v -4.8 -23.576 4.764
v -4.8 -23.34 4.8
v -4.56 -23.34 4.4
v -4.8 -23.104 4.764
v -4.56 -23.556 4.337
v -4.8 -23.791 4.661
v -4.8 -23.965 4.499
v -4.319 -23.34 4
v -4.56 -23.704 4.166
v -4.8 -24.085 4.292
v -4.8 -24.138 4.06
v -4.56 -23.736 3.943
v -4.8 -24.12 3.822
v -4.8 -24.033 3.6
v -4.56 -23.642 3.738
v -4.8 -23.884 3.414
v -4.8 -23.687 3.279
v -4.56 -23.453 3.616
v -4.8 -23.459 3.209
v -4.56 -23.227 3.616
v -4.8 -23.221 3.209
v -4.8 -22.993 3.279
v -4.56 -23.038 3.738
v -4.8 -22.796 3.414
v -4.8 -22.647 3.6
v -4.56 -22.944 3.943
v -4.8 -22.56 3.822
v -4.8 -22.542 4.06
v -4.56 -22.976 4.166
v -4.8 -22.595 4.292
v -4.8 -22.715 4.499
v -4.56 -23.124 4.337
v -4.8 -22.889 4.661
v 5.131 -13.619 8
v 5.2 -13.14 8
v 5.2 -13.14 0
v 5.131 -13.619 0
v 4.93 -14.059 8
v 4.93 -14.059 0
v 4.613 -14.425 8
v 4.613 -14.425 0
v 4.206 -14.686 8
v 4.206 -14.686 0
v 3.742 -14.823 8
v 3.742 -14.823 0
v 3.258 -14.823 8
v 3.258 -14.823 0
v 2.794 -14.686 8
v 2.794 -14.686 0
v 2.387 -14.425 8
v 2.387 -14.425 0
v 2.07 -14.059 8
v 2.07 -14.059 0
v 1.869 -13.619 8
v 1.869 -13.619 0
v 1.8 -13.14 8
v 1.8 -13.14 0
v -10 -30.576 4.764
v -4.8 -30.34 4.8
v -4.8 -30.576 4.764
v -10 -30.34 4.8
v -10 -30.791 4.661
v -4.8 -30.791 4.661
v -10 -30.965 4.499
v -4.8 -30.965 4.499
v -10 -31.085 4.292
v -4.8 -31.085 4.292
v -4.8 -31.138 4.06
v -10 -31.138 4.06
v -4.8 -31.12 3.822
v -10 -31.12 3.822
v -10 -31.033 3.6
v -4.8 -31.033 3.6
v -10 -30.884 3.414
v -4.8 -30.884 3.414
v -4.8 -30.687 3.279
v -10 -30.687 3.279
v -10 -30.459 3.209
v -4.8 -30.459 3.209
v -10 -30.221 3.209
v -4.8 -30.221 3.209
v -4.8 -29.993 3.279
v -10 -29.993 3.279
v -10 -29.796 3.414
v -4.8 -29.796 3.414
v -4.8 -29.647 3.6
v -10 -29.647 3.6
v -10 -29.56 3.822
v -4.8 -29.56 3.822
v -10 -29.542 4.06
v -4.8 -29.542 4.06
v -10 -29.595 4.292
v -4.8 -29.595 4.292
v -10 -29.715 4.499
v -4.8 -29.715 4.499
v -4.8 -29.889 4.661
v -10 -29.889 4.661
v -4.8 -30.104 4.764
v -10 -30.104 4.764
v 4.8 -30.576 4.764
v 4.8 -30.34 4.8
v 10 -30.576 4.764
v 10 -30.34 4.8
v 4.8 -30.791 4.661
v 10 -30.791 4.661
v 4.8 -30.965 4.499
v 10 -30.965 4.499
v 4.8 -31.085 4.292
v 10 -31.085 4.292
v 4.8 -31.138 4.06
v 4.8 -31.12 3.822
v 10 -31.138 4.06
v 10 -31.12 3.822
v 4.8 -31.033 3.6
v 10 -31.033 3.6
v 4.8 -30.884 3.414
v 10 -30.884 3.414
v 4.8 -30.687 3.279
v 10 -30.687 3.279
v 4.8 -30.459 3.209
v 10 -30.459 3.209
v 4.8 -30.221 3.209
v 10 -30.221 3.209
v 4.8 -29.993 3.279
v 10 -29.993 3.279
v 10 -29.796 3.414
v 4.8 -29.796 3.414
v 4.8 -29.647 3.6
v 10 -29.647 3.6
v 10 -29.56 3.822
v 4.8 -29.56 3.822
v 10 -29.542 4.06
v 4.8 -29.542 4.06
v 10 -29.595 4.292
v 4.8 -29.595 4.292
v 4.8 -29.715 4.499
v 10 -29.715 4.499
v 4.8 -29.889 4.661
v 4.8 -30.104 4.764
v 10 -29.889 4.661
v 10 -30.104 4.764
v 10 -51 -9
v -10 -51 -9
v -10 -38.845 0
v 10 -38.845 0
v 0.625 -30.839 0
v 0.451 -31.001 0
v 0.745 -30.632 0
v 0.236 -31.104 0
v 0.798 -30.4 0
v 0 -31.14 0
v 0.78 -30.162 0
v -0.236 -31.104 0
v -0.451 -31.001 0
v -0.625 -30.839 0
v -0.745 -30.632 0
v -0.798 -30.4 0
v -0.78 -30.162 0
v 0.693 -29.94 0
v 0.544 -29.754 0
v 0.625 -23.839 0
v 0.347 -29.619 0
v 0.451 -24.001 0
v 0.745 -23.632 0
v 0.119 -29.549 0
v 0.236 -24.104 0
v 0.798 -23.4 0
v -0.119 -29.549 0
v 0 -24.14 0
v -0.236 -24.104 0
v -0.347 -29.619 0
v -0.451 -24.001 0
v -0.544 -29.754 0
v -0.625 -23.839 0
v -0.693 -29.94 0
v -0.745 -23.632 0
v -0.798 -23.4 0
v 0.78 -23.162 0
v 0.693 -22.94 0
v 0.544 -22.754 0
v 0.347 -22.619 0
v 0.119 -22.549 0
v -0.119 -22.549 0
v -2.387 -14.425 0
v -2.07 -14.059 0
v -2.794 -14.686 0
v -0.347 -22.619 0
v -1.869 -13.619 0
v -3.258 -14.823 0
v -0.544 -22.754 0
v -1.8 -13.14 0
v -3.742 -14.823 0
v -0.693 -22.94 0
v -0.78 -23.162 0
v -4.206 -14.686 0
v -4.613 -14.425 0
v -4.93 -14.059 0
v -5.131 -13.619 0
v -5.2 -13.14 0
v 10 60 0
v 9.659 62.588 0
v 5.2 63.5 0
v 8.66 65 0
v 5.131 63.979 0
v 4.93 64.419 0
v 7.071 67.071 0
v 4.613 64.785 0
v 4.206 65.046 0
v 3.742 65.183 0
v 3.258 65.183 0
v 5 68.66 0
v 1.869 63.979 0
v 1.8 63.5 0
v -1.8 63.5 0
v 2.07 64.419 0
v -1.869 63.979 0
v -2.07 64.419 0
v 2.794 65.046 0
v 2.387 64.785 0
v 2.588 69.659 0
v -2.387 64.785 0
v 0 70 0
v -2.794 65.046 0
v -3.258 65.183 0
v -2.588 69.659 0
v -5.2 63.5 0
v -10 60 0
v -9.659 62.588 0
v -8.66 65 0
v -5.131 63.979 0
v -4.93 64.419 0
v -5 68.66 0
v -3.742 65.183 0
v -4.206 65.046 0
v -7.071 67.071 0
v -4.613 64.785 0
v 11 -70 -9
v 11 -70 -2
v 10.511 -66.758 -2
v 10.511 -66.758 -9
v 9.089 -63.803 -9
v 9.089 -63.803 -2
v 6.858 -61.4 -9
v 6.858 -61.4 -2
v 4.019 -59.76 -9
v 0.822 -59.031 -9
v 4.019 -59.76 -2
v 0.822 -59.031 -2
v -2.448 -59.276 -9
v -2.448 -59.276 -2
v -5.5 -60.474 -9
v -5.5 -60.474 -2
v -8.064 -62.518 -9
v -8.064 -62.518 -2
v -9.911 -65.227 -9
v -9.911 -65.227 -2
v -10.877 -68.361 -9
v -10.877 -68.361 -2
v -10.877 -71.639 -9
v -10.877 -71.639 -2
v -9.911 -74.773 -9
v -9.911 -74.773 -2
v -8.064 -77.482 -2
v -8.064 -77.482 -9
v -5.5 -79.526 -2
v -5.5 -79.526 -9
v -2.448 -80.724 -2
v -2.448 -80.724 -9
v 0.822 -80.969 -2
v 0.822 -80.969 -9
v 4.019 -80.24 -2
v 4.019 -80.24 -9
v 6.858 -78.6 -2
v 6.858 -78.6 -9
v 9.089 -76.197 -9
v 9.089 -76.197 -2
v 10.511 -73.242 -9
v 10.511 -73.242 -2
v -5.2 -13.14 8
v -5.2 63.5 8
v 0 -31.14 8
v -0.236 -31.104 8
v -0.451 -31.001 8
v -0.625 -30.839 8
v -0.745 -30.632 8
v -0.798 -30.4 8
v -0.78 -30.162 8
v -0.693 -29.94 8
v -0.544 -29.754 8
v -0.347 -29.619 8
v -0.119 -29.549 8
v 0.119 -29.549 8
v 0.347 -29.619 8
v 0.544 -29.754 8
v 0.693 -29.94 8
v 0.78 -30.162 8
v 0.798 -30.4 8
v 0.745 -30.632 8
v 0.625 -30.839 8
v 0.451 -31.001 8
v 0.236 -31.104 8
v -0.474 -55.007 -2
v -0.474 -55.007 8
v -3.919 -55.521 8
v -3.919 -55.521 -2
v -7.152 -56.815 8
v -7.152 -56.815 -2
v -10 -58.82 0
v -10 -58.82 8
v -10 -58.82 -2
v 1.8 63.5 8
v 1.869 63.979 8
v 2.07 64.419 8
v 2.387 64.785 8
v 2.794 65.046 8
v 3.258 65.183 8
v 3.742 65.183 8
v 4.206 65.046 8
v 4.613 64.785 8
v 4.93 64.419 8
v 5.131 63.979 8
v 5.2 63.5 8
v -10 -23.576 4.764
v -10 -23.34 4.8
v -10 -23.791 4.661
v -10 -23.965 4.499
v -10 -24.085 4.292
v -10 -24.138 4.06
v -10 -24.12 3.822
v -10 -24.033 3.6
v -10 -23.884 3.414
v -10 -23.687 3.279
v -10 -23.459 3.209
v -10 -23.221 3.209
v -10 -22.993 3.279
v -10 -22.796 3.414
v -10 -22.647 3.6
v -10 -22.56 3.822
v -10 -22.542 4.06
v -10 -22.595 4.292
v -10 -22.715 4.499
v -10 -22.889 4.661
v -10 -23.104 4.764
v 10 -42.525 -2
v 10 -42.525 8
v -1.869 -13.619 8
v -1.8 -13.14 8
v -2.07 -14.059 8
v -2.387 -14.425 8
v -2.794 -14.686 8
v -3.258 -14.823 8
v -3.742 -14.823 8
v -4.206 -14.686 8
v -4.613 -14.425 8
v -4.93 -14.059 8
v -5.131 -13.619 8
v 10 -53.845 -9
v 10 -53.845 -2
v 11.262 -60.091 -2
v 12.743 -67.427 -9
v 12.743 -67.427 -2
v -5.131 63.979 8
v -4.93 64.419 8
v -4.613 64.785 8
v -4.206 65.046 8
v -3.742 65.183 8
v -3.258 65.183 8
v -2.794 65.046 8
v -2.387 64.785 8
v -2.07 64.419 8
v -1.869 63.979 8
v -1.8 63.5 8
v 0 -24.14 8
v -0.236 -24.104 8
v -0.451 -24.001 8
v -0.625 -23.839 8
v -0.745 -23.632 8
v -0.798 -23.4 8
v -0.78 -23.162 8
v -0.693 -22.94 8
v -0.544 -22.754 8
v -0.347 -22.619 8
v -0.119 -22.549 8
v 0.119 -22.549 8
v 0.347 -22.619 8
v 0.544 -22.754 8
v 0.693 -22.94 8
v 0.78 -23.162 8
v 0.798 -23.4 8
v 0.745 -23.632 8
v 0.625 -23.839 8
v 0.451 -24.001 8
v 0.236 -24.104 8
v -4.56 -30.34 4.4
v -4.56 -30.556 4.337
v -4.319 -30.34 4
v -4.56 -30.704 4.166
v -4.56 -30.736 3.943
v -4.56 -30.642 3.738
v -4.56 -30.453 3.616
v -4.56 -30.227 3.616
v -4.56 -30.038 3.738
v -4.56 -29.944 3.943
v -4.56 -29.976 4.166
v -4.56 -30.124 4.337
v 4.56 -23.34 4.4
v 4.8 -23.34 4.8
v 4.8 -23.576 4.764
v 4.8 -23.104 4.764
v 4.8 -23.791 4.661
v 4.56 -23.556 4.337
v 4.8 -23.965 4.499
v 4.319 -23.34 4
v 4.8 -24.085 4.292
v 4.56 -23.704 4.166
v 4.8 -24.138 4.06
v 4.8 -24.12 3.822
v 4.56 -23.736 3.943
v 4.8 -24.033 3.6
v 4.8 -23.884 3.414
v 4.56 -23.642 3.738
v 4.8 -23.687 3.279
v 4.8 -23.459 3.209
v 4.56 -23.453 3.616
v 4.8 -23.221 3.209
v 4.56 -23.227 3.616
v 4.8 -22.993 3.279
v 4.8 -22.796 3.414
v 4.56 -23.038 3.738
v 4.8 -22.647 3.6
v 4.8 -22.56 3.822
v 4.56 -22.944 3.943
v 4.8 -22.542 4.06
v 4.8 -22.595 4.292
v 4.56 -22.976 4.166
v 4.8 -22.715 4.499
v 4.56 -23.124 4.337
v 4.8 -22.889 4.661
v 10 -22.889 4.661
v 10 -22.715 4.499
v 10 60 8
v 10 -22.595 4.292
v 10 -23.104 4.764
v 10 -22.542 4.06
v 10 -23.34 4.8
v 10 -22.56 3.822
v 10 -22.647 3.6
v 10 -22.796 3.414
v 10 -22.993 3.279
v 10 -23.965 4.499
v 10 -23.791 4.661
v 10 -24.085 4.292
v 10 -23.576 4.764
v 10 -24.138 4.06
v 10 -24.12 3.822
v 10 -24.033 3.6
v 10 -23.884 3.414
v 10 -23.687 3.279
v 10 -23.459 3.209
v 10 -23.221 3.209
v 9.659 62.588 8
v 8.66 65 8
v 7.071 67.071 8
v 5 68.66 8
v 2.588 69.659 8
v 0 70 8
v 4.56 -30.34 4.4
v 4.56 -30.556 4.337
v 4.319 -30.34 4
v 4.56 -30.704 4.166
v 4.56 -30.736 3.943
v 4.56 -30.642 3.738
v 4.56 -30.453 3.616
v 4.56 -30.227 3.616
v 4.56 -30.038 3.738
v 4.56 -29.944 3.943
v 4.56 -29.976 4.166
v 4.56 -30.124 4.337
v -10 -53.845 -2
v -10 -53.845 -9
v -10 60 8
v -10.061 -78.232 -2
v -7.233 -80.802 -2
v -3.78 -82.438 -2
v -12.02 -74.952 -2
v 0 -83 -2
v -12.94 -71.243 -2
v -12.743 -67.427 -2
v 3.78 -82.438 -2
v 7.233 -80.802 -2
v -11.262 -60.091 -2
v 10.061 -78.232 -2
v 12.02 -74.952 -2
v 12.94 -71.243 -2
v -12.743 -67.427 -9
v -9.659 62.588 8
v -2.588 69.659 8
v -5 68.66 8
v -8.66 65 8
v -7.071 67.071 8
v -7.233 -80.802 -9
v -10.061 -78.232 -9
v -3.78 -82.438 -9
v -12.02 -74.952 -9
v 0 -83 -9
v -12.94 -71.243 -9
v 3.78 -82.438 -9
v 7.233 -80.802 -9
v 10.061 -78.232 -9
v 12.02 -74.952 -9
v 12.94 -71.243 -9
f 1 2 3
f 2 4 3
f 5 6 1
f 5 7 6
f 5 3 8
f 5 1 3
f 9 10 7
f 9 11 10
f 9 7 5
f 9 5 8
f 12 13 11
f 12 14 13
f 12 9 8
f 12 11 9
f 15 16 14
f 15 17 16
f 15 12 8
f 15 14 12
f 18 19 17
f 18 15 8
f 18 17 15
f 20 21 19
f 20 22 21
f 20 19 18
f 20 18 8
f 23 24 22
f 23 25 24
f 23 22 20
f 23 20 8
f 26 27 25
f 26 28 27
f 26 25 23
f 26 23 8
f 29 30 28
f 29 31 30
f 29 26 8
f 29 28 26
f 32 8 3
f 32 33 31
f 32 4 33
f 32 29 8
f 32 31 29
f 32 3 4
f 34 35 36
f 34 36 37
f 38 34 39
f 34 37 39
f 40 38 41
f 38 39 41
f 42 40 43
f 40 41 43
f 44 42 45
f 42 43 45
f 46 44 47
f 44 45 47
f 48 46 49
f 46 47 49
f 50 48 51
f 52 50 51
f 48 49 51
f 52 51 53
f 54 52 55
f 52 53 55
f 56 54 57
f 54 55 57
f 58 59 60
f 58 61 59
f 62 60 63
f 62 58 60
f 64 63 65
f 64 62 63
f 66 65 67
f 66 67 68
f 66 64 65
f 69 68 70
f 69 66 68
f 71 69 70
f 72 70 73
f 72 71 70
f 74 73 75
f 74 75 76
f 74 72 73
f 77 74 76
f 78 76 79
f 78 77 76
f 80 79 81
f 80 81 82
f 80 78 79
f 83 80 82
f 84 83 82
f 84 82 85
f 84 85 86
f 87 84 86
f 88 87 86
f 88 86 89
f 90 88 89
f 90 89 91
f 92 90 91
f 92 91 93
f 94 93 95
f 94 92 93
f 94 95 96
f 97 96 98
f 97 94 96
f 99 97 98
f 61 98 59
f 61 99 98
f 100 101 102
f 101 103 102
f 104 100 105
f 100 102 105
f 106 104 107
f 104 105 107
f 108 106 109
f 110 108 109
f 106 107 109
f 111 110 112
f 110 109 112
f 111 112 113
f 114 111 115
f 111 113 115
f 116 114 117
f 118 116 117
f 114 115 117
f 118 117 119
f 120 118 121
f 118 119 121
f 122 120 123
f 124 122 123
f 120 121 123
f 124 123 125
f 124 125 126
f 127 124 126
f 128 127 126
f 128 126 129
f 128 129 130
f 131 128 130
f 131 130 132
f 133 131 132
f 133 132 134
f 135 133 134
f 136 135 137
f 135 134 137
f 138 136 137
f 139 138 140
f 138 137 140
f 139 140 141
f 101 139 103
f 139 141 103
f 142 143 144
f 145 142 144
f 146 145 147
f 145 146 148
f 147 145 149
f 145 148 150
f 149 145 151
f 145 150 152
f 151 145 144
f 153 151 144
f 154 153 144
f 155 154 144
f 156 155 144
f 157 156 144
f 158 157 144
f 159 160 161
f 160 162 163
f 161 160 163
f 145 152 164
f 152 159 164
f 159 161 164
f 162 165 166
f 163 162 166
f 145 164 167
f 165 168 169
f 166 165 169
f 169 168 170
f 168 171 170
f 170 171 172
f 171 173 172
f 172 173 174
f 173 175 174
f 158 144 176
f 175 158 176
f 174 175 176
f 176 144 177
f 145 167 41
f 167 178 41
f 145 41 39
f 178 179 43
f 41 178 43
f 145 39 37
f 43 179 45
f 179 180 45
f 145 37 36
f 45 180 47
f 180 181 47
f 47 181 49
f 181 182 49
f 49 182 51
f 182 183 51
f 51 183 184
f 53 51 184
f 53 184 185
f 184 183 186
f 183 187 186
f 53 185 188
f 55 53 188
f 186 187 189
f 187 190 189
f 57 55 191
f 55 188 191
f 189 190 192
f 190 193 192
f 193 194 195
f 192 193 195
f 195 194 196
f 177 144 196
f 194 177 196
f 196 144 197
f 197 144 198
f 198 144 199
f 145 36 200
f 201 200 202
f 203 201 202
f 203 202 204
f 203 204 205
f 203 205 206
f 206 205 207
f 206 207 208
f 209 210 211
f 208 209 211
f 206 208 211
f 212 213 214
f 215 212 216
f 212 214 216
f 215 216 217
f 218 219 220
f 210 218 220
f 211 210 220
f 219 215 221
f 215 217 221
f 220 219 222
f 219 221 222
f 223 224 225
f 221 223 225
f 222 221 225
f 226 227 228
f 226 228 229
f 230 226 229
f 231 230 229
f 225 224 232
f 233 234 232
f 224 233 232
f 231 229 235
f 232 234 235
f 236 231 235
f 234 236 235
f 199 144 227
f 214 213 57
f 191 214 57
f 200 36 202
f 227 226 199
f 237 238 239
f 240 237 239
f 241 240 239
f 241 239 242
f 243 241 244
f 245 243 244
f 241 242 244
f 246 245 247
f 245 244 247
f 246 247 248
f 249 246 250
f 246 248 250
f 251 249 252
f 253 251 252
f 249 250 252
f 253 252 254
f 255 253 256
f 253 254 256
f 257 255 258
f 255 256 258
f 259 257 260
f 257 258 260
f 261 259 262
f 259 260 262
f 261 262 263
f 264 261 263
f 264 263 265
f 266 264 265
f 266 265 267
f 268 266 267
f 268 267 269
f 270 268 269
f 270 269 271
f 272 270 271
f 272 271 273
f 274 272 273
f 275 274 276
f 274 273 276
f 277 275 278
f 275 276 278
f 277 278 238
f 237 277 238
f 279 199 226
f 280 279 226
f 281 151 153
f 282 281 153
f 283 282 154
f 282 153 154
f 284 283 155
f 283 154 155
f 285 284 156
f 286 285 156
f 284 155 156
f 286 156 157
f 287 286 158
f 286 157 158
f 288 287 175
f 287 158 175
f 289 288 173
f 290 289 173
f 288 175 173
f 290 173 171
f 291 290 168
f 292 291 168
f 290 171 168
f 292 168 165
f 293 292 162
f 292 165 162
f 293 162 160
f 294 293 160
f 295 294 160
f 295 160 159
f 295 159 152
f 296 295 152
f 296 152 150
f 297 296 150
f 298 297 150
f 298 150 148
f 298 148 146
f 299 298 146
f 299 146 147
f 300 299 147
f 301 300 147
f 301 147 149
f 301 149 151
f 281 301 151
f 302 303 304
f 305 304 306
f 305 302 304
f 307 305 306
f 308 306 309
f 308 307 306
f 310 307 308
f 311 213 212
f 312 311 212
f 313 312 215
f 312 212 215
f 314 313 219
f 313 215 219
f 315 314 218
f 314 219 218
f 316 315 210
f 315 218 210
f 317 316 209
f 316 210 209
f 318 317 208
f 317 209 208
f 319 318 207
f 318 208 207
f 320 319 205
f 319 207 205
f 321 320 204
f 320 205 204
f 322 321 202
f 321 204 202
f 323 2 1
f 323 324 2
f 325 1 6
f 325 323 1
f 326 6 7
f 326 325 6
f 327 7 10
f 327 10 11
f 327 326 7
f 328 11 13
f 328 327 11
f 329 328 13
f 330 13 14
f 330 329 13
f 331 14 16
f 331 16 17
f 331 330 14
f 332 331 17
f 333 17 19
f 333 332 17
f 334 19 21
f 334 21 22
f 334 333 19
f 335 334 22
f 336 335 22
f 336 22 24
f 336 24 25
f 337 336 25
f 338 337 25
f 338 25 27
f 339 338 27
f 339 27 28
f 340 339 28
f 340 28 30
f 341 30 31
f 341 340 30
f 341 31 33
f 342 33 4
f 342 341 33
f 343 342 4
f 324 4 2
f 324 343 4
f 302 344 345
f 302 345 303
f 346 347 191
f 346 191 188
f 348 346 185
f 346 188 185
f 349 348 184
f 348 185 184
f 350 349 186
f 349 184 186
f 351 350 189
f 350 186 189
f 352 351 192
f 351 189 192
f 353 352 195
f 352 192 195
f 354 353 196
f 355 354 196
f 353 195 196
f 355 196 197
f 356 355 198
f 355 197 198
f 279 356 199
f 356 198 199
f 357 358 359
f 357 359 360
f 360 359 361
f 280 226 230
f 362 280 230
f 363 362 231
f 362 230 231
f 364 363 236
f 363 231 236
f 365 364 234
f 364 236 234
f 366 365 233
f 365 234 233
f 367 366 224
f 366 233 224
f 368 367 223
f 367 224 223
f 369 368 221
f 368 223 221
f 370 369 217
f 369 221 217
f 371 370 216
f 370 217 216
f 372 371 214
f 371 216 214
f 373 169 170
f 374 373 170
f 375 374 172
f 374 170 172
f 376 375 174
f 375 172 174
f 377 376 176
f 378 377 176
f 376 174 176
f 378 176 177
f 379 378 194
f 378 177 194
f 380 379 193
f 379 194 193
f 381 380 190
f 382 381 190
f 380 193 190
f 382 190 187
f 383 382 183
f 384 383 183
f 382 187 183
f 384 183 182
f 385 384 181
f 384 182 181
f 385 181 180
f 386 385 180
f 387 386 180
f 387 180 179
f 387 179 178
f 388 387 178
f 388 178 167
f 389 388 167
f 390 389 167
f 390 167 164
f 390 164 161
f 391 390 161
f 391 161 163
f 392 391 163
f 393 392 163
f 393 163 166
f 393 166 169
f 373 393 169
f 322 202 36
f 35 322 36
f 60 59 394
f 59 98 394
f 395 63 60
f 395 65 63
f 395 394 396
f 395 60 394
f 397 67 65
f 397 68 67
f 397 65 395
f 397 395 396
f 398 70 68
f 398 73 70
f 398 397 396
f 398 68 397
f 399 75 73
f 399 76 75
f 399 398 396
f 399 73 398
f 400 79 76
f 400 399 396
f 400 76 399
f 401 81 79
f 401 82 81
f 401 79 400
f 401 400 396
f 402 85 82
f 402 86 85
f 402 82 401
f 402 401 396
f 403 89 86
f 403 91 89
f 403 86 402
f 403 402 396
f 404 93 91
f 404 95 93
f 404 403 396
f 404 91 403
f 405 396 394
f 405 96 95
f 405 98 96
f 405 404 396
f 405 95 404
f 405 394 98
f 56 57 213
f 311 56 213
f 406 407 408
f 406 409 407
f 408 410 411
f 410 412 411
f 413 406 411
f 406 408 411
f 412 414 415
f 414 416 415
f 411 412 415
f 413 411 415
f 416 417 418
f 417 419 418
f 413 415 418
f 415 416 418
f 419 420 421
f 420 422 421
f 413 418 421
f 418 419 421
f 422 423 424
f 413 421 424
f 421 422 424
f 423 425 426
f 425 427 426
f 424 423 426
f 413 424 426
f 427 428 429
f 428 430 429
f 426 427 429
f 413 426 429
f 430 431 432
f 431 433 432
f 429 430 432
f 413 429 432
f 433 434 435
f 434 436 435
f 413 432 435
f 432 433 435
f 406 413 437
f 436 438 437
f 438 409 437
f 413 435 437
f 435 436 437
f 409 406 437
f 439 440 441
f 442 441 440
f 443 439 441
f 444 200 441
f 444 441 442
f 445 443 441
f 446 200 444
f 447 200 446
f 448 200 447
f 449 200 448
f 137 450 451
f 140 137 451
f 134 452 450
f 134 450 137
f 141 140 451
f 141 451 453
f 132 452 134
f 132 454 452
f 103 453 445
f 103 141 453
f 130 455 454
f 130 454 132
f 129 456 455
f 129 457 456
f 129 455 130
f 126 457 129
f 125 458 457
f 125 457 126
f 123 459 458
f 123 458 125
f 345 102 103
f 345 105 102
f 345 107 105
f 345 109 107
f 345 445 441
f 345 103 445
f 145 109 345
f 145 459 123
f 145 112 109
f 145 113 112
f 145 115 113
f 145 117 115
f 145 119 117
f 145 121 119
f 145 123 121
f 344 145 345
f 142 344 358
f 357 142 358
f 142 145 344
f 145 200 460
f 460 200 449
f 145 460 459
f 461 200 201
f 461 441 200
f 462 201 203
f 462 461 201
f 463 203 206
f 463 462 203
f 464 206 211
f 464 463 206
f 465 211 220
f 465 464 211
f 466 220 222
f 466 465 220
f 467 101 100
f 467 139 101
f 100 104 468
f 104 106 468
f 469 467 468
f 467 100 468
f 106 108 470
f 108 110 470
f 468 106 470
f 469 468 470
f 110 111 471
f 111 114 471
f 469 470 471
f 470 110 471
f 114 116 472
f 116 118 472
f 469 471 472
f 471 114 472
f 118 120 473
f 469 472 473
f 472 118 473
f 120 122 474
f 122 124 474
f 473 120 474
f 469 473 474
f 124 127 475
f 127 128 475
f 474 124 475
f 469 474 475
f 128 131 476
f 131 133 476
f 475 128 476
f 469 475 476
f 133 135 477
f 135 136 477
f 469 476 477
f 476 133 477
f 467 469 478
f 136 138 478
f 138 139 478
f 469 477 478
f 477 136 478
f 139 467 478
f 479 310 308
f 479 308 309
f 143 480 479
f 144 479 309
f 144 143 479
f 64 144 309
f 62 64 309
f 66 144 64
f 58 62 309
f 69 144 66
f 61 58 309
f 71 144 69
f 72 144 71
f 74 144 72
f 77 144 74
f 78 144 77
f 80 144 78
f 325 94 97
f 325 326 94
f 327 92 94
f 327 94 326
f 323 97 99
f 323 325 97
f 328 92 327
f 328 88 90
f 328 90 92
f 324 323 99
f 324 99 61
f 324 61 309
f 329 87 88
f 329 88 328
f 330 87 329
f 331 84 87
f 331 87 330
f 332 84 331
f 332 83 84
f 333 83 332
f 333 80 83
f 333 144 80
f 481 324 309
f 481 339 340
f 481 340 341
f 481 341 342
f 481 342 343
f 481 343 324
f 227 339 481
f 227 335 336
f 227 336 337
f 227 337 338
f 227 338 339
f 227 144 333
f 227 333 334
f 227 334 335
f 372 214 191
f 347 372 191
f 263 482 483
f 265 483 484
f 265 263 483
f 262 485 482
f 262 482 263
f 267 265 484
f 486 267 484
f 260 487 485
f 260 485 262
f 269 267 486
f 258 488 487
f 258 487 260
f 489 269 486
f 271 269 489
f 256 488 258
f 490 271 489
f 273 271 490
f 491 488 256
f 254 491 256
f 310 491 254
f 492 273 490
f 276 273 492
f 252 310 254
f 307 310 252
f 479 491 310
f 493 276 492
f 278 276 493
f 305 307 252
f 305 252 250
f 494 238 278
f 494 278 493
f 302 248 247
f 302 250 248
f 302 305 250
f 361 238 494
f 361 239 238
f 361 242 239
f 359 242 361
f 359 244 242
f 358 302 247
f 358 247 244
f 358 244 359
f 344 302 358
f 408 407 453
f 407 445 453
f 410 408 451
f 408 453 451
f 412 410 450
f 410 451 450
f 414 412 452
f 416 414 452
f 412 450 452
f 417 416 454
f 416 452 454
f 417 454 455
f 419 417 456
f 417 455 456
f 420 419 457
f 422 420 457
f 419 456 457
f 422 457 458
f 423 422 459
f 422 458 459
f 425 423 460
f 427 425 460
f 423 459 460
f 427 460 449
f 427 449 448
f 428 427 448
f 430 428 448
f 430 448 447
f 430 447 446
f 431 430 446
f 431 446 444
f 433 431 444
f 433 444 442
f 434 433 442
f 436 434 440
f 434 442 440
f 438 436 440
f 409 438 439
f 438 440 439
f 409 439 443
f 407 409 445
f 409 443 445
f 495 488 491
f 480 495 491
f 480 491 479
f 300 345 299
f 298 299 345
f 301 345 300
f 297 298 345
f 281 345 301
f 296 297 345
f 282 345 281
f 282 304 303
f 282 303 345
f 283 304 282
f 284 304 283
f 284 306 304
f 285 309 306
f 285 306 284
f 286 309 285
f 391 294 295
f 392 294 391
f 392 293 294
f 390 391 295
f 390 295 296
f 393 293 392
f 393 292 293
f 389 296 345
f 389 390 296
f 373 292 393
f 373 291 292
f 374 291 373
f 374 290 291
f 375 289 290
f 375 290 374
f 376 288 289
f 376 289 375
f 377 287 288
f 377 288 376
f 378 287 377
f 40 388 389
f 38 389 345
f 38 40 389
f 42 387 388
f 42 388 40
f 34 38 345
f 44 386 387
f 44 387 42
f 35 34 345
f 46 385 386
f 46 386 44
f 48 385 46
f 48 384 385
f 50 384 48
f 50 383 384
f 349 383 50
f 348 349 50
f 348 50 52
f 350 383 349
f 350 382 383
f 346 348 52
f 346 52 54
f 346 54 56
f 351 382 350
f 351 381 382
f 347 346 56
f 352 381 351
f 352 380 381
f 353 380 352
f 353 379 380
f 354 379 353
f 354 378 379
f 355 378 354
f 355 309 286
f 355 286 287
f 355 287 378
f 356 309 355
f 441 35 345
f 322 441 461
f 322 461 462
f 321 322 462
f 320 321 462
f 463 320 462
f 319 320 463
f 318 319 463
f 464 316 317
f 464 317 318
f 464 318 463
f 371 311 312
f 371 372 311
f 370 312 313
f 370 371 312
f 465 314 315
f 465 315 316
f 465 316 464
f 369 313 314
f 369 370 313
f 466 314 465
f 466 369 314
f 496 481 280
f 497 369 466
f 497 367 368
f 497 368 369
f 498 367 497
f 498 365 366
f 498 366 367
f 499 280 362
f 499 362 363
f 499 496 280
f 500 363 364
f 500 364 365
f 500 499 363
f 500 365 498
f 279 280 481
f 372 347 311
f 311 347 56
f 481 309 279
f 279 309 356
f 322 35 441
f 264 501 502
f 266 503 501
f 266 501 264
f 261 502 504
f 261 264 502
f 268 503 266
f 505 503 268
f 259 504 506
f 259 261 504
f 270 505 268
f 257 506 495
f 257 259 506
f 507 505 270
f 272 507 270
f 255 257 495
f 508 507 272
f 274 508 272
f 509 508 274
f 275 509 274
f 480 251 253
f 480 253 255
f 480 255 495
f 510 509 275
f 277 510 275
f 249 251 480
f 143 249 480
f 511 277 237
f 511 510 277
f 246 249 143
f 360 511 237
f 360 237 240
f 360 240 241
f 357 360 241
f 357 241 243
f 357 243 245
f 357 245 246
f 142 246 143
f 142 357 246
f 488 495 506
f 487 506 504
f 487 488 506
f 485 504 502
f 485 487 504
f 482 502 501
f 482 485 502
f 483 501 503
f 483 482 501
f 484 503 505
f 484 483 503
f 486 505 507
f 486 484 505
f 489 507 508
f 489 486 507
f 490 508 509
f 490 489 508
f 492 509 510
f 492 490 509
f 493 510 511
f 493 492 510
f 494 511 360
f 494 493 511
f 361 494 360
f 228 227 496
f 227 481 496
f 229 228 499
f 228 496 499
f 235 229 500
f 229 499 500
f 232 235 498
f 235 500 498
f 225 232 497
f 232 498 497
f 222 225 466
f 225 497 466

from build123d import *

# Parameters (mm, degrees)
SKETCH1_W                             = 140
SKETCH1_H                             = 20
BOSS_EXTRUDE1_DEPTH                   = 8
FILLET1_R                             = 10
TOP_SCREW_HOLES_AT_2_COUNT            = 2
TOP_SCREW_HOLES_AT_2_PITCH            = 7
SIDE_SCREW_HOLES_AT_2_COUNT           = 2
SIDE_SCREW_HOLES_AT_2_PITCH           = 7
BOSS_EXTRUDE2_START                   = -6
SKETCH23_R                            = 13
SKETCH23_R_2                          = 11
BOSS_EXTRUDE2_DEPTH                   = 7
CUT_EXTRUDE1_DEPTH                    = 4.5
CUT_EXTRUDE1_DEPTH_BACK               = 4.5
SKETCH23_4_R                          = 11
CUT_EXTRUDE2_START                    = -4
SKETCH23_5_R                          = 13
SKETCH23_5_R_2                        = 11
CUT_EXTRUDE2_DEPTH                    = 8
BOSS_EXTRUDE7_DEPTH                   = 9
CUT_EXTRUDE3_DEPTH                    = 11
CUT_EXTRUDE4_START                    = -2
CUT_EXTRUDE4_DEPTH                    = 2
BOSS_EXTRUDE3_START                   = -13
SKETCH24_R                            = 4
BOSS_EXTRUDE3_DEPTH                   = 9
BOSS_EXTRUDE4_START                   = -8
SKETCH25_R                            = 13
BOSS_EXTRUDE4_DEPTH                   = 8
SKETCH34_R                            = 5
BOSS_EXTRUDE9_DEPTH                   = 4
SKETCH39_R                            = 5
SKETCH39_R_2                          = 1.7
BOSS_EXTRUDE10_DEPTH                  = 2
BODY_MOVE_COPY1_OUTLINE_R             = 0.8
BODY_MOVE_COPY1_DEPTH                 = 3.1999999
BODY_MOVE_COPY1_START                 = 4.8000001
BODY_MOVE_COPY1_2_OUTLINE_R           = 0.8
BODY_MOVE_COPY1_2_DEPTH               = 3.1999999
BODY_MOVE_COPY1_START_2               = -9
BODY_MOVE_COPY1_3_OUTLINE_R           = 11
BODY_MOVE_COPY1_3_DEPTH               = 7
BODY_MOVE_COPY1_START_3               = -2
BODY_MOVE_COPY1_4_DEPTH               = 10
BODY_MOVE_COPY1_START_4               = 3.1999999
BODY_MOVE_COPY1_5_OUTLINE_R           = 0.8
BODY_MOVE_COPY1_5_DEPTH               = 1.6000002
CUT_EXTRUDE5_DEPTH                    = 9
BOSS_EXTRUDE11_DEPTH                  = 8
BOSS_EXTRUDE13_REACH                  = 87.012
BOSS_EXTRUDE13_DIRECTION_2_REACH      = 87.012
CUT_EXTRUDE6_DEPTH                    = 2.6
CUT_EXTRUDE7_START                    = -10
CUT_EXTRUDE7_DEPTH                    = 10
BODY_MOVE_COPY3_ANGLE                 = 170
BOSS_EXTRUDE14_REACH                  = 212.931
SKETCH46_W                            = 8.790313744
SKETCH46_H                            = 8
BOSS_EXTRUDE14_DIRECTION_2_REACH      = 212.931
BOSS_EXTRUDE14_DIRECTION_2_END_RADIUS = 13
BODY_MOVE_COPY4_ANGLE                 = 10


with BuildPart() as part:
    # Sketch1 → Boss-Extrude1 (new body)
    with BuildSketch(Plane(origin=(0, 0, 0), x_dir=(0, 1, 0), z_dir=(0, 0, 1))):
        Rectangle(SKETCH1_W, SKETCH1_H)
        with BuildLine():
            Line((-13.14, 5.2), (63.5, 5.2))
            ThreePointArc((63.5, 5.2), (65.2, 3.5), (63.5, 1.8))
            Line((63.5, 1.8), (-13.14, 1.8))
            ThreePointArc((-13.14, 1.8), (-14.84, 3.5), (-13.14, 5.2))
        make_face(mode=Mode.SUBTRACT)
        with BuildLine():
            Line((-13.14, -1.8), (63.5, -1.8))
            ThreePointArc((63.5, -1.8), (65.2, -3.5), (63.5, -5.2))
            Line((63.5, -5.2), (-13.14, -5.2))
            ThreePointArc((-13.14, -5.2), (-14.84, -3.5), (-13.14, -1.8))
        make_face(mode=Mode.SUBTRACT)
    extrude(amount=BOSS_EXTRUDE1_DEPTH)

    # Fillet1
    fillet1_edges = [part.edges().sort_by_distance(p)[0] for p in [
        (-10, 70, 4),
        (10, 70, 4),
    ]]
    fillet(fillet1_edges, radius=FILLET1_R - 0.0001)  # a hair under: the kernel refuses the full size

    # Sketch19 → Top - Screw Holes (revolve, cut)
    with BuildSketch(Plane(origin=(0, -23.34, 8), x_dir=(0, -1, 0), z_dir=(1, 0, 0))):
        Polygon((0, 0), (0, 5.680688495), (0.8, 5.2), (0.8, 0), align=None)
    top_screw_holes = revolve(axis=Axis((0, -23.34, 14.35), (0, 0, -1)), mode=Mode.SUBTRACT)

    # Top - Screw Holes at 2: Top - Screw Holes ×2
    with Locations(*[(0, -i * TOP_SCREW_HOLES_AT_2_PITCH, 0) for i in range(1, TOP_SCREW_HOLES_AT_2_COUNT)]):
        add(top_screw_holes, mode=Mode.SUBTRACT)

    # Sketch21 → Side - Screw Holes (revolve, cut)
    with BuildSketch(Plane(origin=(-10, -23.34, 4), x_dir=(0, 0, 1), z_dir=(0, 1, 0))):
        Polygon((0, 0), (0, 5.680688495), (0.8, 5.2), (0.8, 0), align=None)
    side_screw_holes = revolve(axis=Axis((-16.35, -23.34, 4), (1, 0, 0)), mode=Mode.SUBTRACT)

    # Side - Screw Holes at 2: Side - Screw Holes ×2
    with Locations(*[(0, -i * SIDE_SCREW_HOLES_AT_2_PITCH, 0) for i in range(1, SIDE_SCREW_HOLES_AT_2_COUNT)]):
        add(side_screw_holes, mode=Mode.SUBTRACT)

    # Mirror1: Side - Screw Holes across plane
    add(side_screw_holes.mirror(Plane(origin=(0, 0, 0), x_dir=(0, 0, 1), z_dir=(1, 0, 0))), mode=Mode.SUBTRACT)

    # Mirror1 copy 1 sketch → Mirror1 copy 1 (revolve, cut)
    with BuildSketch(Plane(origin=(10, -30.34, 4), x_dir=(0, 0, 1), z_dir=(0, 1, 0))):
        Polygon((0, 0), (0, -5.680688495), (0.8, -5.2), (0.8, 0), align=None)
    revolve(axis=Axis((16.35, -30.34, 4), (1, 0, 0)), mode=Mode.SUBTRACT)

    # Mirror2: Top - Screw Holes across plane
    add(top_screw_holes.mirror(Plane.XY.offset(4)), mode=Mode.SUBTRACT)

    # Mirror2 copy 1 sketch → Mirror2 copy 1 (revolve, cut)
    with BuildSketch(Plane(origin=(0, -30.34, 0), x_dir=(0, -1, 0), z_dir=(1, 0, 0))):
        Polygon((0, 0), (0, -5.680688495), (0.8, -5.2), (0.8, 0), align=None)
    revolve(axis=Axis((0, -30.34, -6.35), (0, 0, -1)), mode=Mode.SUBTRACT)

    # Sketch23<4> → Cut-Extrude1 (cut, two sides: drawn at the far end of the back side and taken through both)
    with BuildSketch(Plane(origin=(0, 0, 4), x_dir=(0, -1, 0), z_dir=(0, 0, 1)).offset(-CUT_EXTRUDE1_DEPTH_BACK)):
        with Locations(Location((70, 0, 0), (0, 0, 90))):
            Circle(SKETCH23_4_R)
    extrude(amount=CUT_EXTRUDE1_DEPTH + CUT_EXTRUDE1_DEPTH_BACK, mode=Mode.SUBTRACT)

    # Sketch23<5> → Cut-Extrude2 (cut)
    with BuildSketch(Plane(origin=(0, 0, 4), x_dir=(0, -1, 0), z_dir=(0, 0, 1)).offset(CUT_EXTRUDE2_START)):
        with Locations(Location((70, 0, 0), (0, 0, 90))):
            Circle(SKETCH23_5_R)
        with Locations(Location((70, 0, 0), (0, 0, 90))):
            Circle(SKETCH23_5_R_2, mode=Mode.SUBTRACT)
    extrude(amount=CUT_EXTRUDE2_DEPTH, mode=Mode.SUBTRACT)



with BuildPart() as body_2:
    # Sketch23 → Boss-Extrude2 (new body)
    with BuildSketch(Plane(origin=(0, 0, 4), x_dir=(0, -1, 0), z_dir=(0, 0, 1)).offset(BOSS_EXTRUDE2_START)):
        with Locations(Location((70, 0, 0), (0, 0, 90))):
            Circle(SKETCH23_R)
        with Locations(Location((70, 0, 0), (0, 0, 90))):
            Circle(SKETCH23_R_2, mode=Mode.SUBTRACT)
    extrude(amount=-BOSS_EXTRUDE2_DEPTH)


with BuildPart() as part_1:
    add(part.part)

    add(body_2.part)  # Boss-Extrude7 merges body 2
    # Sketch29 → Boss-Extrude7 (add)
    with BuildSketch(Plane(origin=(0, 0, 0), x_dir=(1, 0, 0), z_dir=(0, 0, -1))):
        with BuildLine():
            ThreePointArc((-10, 53.844505579), (0, 51), (10, 53.844505579))
            Line((10, 53.844505579), (10, 61.693376137))
            ThreePointArc((10, 61.693376137), (0, 57), (-10, 61.693376137))
            Line((-10, 61.693376137), (-10, 53.844505579))
        make_face()
        with BuildLine():
            Line((-12.742776356, 67.426743165), (-10, 53.844505579))
            Line((-10, 53.844505579), (-10, 61.693376137))
            ThreePointArc((-10, 61.693376137), (-11.727162635, 64.389861273), (-12.742776356, 67.426743165))
        make_face()
        with BuildLine():
            Line((10, 61.693376137), (10, 53.844505579))
            Line((10, 53.844505579), (12.742776356, 67.426743165))
            ThreePointArc((12.742776356, 67.426743165), (11.727162635, 64.389861273), (10, 61.693376137))
        make_face()
    extrude(amount=BOSS_EXTRUDE7_DEPTH)

    # Cut-Extrude3: read off the stored shape, not the designer's step
    # Cut-Extrude3 outline → Cut-Extrude3 (cut)
    with BuildSketch(Plane.XY.offset(-2)):
        with BuildLine():
            ThreePointArc((11.261507826, -60.091496507), (0, -55), (-11.261507826, -60.091496507))
            Line((-11.261507826, -60.091496507), (-12.742776356, -67.426743165))
            ThreePointArc((-12.742776356, -67.426743165), (0, -57), (12.742776356, -67.426743165))
            Line((12.742776356, -67.426743165), (11.261507826, -60.091496507))
        make_face()
    extrude(amount=CUT_EXTRUDE3_DEPTH, mode=Mode.SUBTRACT)

    # Sketch30 → Cut-Extrude4 (cut)
    with BuildSketch(Plane.XY.offset(CUT_EXTRUDE4_START)):
        with BuildLine():
            Line((-10, -58.819660113), (-10, -53.844505579))
            Line((-10, -53.844505579), (-11.261507826, -60.091496507))
            ThreePointArc((-11.261507826, -60.091496507), (-10.649756838, -59.436729707), (-10, -58.819660113))
        make_face()
        with BuildLine():
            Line((11.261507826, -60.091496507), (10, -53.844505579))
            Line((10, -53.844505579), (10, -58.819660113))
            ThreePointArc((10, -58.819660113), (10.649756838, -59.436729707), (11.261507826, -60.091496507))
        make_face()
    extrude(amount=CUT_EXTRUDE4_DEPTH, mode=Mode.SUBTRACT)

    # Boss-Extrude13: up to this face of the body (flat: up to its plane)
    boss_extrude13_end = Plane(part_1.part.faces().sort_by_distance((10, 0.113380243, 3.94798514))[0])
    # Sketch43 → Boss-Extrude13 (add, up to the picked face)
    with BuildSketch(Plane.YZ, mode=Mode.PRIVATE) as boss_extrude13_sk1:
        Polygon((-51, -9), (-38.844505579, 0), (-51, 0), (-53.844505579, 0), (-53.844505579, -9), align=None)
    boss_extrude13_tool1 = split(extrude(boss_extrude13_sk1.sketch, amount=BOSS_EXTRUDE13_REACH, mode=Mode.PRIVATE), bisect_by=boss_extrude13_end, keep=Keep.BOTH, mode=Mode.PRIVATE)
    add(boss_extrude13_tool1.solids().sort_by(Axis((0, -48.693363, -3.478215), (1, 0, 0)))[0])

    # Boss-Extrude13 direction 2: up to this face of the body (flat: up to its plane)
    boss_extrude13_direction_2_end = Plane(part_1.part.faces().sort_by_distance((-10, 0.113380243, 3.94798514))[0])
    # Sketch43 → Boss-Extrude13 direction 2 (add, up to the picked face)
    with BuildSketch(Plane.YZ, mode=Mode.PRIVATE) as boss_extrude13_direction_2_sk1:
        Polygon((-51, -9), (-38.844505579, 0), (-51, 0), (-53.844505579, 0), (-53.844505579, -9), align=None)
    boss_extrude13_direction_2_tool1 = split(extrude(boss_extrude13_direction_2_sk1.sketch, amount=-BOSS_EXTRUDE13_DIRECTION_2_REACH, mode=Mode.PRIVATE), bisect_by=boss_extrude13_direction_2_end, keep=Keep.BOTH, mode=Mode.PRIVATE)
    add(boss_extrude13_direction_2_tool1.solids().sort_by(Axis((0, -48.693363, -3.478215), (-1, 0, 0)))[0])

    # Sketch45 → Cut-Extrude7 (cut)
    with BuildSketch(Plane.XY.offset(8).offset(CUT_EXTRUDE7_START)):
        with BuildLine():
            Line((10, -42.525225805), (-0.473860479, -55.00748666))
            ThreePointArc((-0.473860479, -55.00748666), (5.13030215, -55.904610688), (10, -58.819660113))
            Line((10, -58.819660113), (10, -42.525225805))
        make_face()
    extrude(amount=CUT_EXTRUDE7_DEPTH, mode=Mode.SUBTRACT)


with BuildPart() as body_2_2:
    # Sketch24 → Boss-Extrude3 (new body)
    with BuildSketch(Plane(origin=(0, 0, 4), x_dir=(0, -1, 0), z_dir=(0, 0, 1)).offset(BOSS_EXTRUDE3_START)):
        with Locations(Location((70, 0, 0), (0, 0, 90))):
            Circle(SKETCH24_R)
    extrude(amount=BOSS_EXTRUDE3_DEPTH)

    # Sketch25 → Boss-Extrude4 (add)
    with BuildSketch(Plane(origin=(0, 0, 0), x_dir=(1, 0, 0), z_dir=(0, 0, -1)).offset(BOSS_EXTRUDE4_START)):
        with Locations(Location((0, 70, 0), (0, 0, 180))):
            Circle(SKETCH25_R)
    extrude(amount=BOSS_EXTRUDE4_DEPTH)


with BuildPart() as body_3:
    # Sketch34 → Boss-Extrude9 (new body)
    with BuildSketch(Plane(origin=(0, 0, -9), x_dir=(1, 0, 0), z_dir=(0, 0, -1))):
        with Locations(Location((0, 70, 0), (0, 0, 180))):
            Circle(SKETCH34_R)
    extrude(amount=BOSS_EXTRUDE9_DEPTH)


with BuildPart() as csk_for_m3_countersunk_flat_head_screw1_tool:
    # Sketch38 → CSK for M3 Countersunk Flat Head Screw1 (revolve)
    with BuildSketch(Plane(origin=(0, -70, -13), x_dir=(0, 1, 0), z_dir=(1, 0, 0))):
        Polygon((0, 0), (0, 21), (1.7, 21), (1.7, 1.45), (3.15, 0), align=None)
    revolve(axis=Axis((0, -70, -19.35), (0, 0, 1)))


with BuildPart() as body_2_2_1:
    add(body_2_2.part)

    # CSK for M3 Countersunk Flat Head Screw1: cut by csk_for_m3_countersunk_flat_head_screw1_tool
    add(csk_for_m3_countersunk_flat_head_screw1_tool.part, mode=Mode.SUBTRACT)

    # Sketch39 → Boss-Extrude10 (add)
    with BuildSketch(Plane(origin=(0, 0, 0), x_dir=(1, 0, 0), z_dir=(0, 0, -1))):
        with Locations(Location((0, 70, 0), (0, 0, 180))):
            Circle(SKETCH39_R)
        with Locations(Location((0, 70, 0), (0, 0, 180))):
            Circle(SKETCH39_R_2, mode=Mode.SUBTRACT)
    extrude(amount=BOSS_EXTRUDE10_DEPTH)



with BuildPart() as body_3_1:
    add(body_3.part)

    # CSK for M3 Countersunk Flat Head Screw1: cut by csk_for_m3_countersunk_flat_head_screw1_tool
    add(csk_for_m3_countersunk_flat_head_screw1_tool.part, mode=Mode.SUBTRACT)


with BuildPart() as body_4:
    # Body-Move/Copy1: read off the stored shape, not the designer's step
    # Body-Move/Copy1 outline → Body-Move/Copy1 (new body)
    with BuildSketch(Plane.XY):
        with BuildLine():
            Line((10, -58.819660113), (10, 60))
            ThreePointArc((10, 60), (7.071067812, 67.071067812), (0, 70))
            ThreePointArc((0, 70), (-7.071067812, 67.071067812), (-10, 60))
            Line((-10, 60), (-10, -58.819660113))
            ThreePointArc((-10, -58.819660113), (0, -55), (10, -58.819660113))
        make_face()
        with BuildLine():
            ThreePointArc((1.8, 63.5), (3.5, 65.2), (5.2, 63.5))
            Line((5.2, 63.5), (5.2, -13.14))
            ThreePointArc((5.2, -13.14), (3.5, -14.84), (1.8, -13.14))
            Line((1.8, -13.14), (1.8, 63.5))
        make_face(mode=Mode.SUBTRACT)
        with Locations((0, -30.34)):
            Circle(BODY_MOVE_COPY1_OUTLINE_R, mode=Mode.SUBTRACT)
        with Locations((0, -23.34)):
            Circle(BODY_MOVE_COPY1_OUTLINE_R, mode=Mode.SUBTRACT)
        with BuildLine():
            Line((-5.2, -13.14), (-5.2, 63.5))
            ThreePointArc((-5.2, 63.5), (-3.5, 65.2), (-1.8, 63.5))
            Line((-1.8, 63.5), (-1.8, -13.14))
            ThreePointArc((-1.8, -13.14), (-3.5, -14.84), (-5.2, -13.14))
        make_face(mode=Mode.SUBTRACT)
    extrude(amount=BODY_MOVE_COPY1_DEPTH)

    # Body-Move_Copy1 2 outline → Body-Move_Copy1 2 (add)
    with BuildSketch(Plane.XY.offset(BODY_MOVE_COPY1_START)):
        with BuildLine():
            Line((10, -58.819660113), (10, 60))
            ThreePointArc((10, 60), (7.071067812, 67.071067812), (0, 70))
            ThreePointArc((0, 70), (-7.071067812, 67.071067812), (-10, 60))
            Line((-10, 60), (-10, -58.819660113))
            ThreePointArc((-10, -58.819660113), (0, -55), (10, -58.819660113))
        make_face()
        with BuildLine():
            ThreePointArc((1.8, 63.5), (3.5, 65.2), (5.2, 63.5))
            Line((5.2, 63.5), (5.2, -13.14))
            ThreePointArc((5.2, -13.14), (3.5, -14.84), (1.8, -13.14))
            Line((1.8, -13.14), (1.8, 63.5))
        make_face(mode=Mode.SUBTRACT)
        with Locations((0, -30.34)):
            Circle(BODY_MOVE_COPY1_2_OUTLINE_R, mode=Mode.SUBTRACT)
        with Locations((0, -23.34)):
            Circle(BODY_MOVE_COPY1_2_OUTLINE_R, mode=Mode.SUBTRACT)
        with BuildLine():
            Line((-5.2, -13.14), (-5.2, 63.5))
            ThreePointArc((-5.2, 63.5), (-3.5, 65.2), (-1.8, 63.5))
            Line((-1.8, 63.5), (-1.8, -13.14))
            ThreePointArc((-1.8, -13.14), (-3.5, -14.84), (-5.2, -13.14))
        make_face(mode=Mode.SUBTRACT)
    extrude(amount=BODY_MOVE_COPY1_2_DEPTH)

    # Body-Move_Copy1 3 outline → Body-Move_Copy1 3 (add)
    with BuildSketch(Plane.XY.offset(BODY_MOVE_COPY1_START_2)):
        with BuildLine():
            Line((12.742776356, -67.426743165), (10, -53.844505579))
            ThreePointArc((10, -53.844505579), (0, -51), (-10, -53.844505579))
            Line((-10, -53.844505579), (-12.742776356, -67.426743165))
            ThreePointArc((-12.742776356, -67.426743165), (0, -83), (12.742776356, -67.426743165))
        make_face()
        with Locations((0, -70)):
            Circle(BODY_MOVE_COPY1_3_OUTLINE_R, mode=Mode.SUBTRACT)
    extrude(amount=BODY_MOVE_COPY1_3_DEPTH)

    # Body-Move_Copy1 4 outline → Body-Move_Copy1 4 (add)
    with BuildSketch(Plane.XY.offset(BODY_MOVE_COPY1_START_3)):
        with BuildLine():
            ThreePointArc((10, -53.844505579), (0, -51), (-10, -53.844505579))
            Line((-10, -53.844505579), (-10, -58.819660113))
            ThreePointArc((-10, -58.819660113), (0, -55), (10, -58.819660113))
            Line((10, -58.819660113), (10, -53.844505579))
        make_face()
    extrude(amount=BODY_MOVE_COPY1_4_DEPTH)

    # Body-Move_Copy1 5 outline → Body-Move_Copy1 5 (add)
    with BuildSketch(Plane.XY.offset(BODY_MOVE_COPY1_START_4)):
        with BuildLine():
            Line((10, -53.844505579), (10, 60))
            ThreePointArc((10, 60), (7.071067812, 67.071067812), (0, 70))
            ThreePointArc((0, 70), (-7.071067812, 67.071067812), (-10, 60))
            Line((-10, 60), (-10, -53.844505579))
            ThreePointArc((-10, -53.844505579), (0, -51), (10, -53.844505579))
        make_face()
        with Locations((0, -30.34)):
            Circle(BODY_MOVE_COPY1_5_OUTLINE_R, mode=Mode.SUBTRACT)
        with Locations((0, -23.34)):
            Circle(BODY_MOVE_COPY1_5_OUTLINE_R, mode=Mode.SUBTRACT)
        with BuildLine():
            Line((-5.2, -13.14), (-5.2, 63.5))
            ThreePointArc((-5.2, 63.5), (-3.5, 65.2), (-1.8, 63.5))
            Line((-1.8, 63.5), (-1.8, -13.14))
            ThreePointArc((-1.8, -13.14), (-3.5, -14.84), (-5.2, -13.14))
        make_face(mode=Mode.SUBTRACT)
        with BuildLine():
            Line((1.8, -13.14), (1.8, 63.5))
            ThreePointArc((1.8, 63.5), (3.5, 65.2), (5.2, 63.5))
            Line((5.2, 63.5), (5.2, -13.14))
            ThreePointArc((5.2, -13.14), (3.5, -14.84), (1.8, -13.14))
        make_face(mode=Mode.SUBTRACT)
    extrude(amount=BODY_MOVE_COPY1_5_DEPTH)

    # Body-Move_Copy1 6 outline → Body-Move_Copy1 6 (revolve, cut)
    with BuildSketch(Plane(origin=(0, -30.34, 4), x_dir=(0, 1, 0), z_dir=(0, 0, -1))):
        Polygon((0.8, -4.8), (0, -4.319311505), (0, -10), (0.8, -10), align=None)
        Polygon((0, 10), (0, 4.319311505), (0.8, 4.8), (0.8, 10), align=None)
    revolve(axis=Axis((0, -30.34, 4), (1, 0, 0)), mode=Mode.SUBTRACT)

    # Body-Move_Copy1 7 outline → Body-Move_Copy1 7 (revolve, cut)
    with BuildSketch(Plane(origin=(0, -23.34, 4), x_dir=(0, 1, 0), z_dir=(0, 0, -1))):
        Polygon((0.8, -4.8), (0, -4.319311505), (0, -10), (0.8, -10), align=None)
        Polygon((0, 10), (0, 4.319311505), (0.8, 4.8), (0.8, 10), align=None)
    revolve(axis=Axis((0, -23.34, 4), (1, 0, 0)), mode=Mode.SUBTRACT)

    # Sketch40 → Cut-Extrude5 (cut)
    with BuildSketch(Plane(origin=(0, 0, 0), x_dir=(1, 0, 0), z_dir=(0, 0, -1))):
        with BuildLine():
            Line((-12.742776356, 67.426743165), (-10, 53.844505579))
            ThreePointArc((-10, 53.844505579), (0, 51), (10, 53.844505579))
            Line((10, 53.844505579), (12.742776356, 67.426743165))
            ThreePointArc((12.742776356, 67.426743165), (0, 83), (-12.742776356, 67.426743165))
        make_face()
    extrude(amount=CUT_EXTRUDE5_DEPTH, mode=Mode.SUBTRACT)


with BuildPart() as body_2_2_2:
    add(body_2_2_1.part)

    add(body_4.part)  # Boss-Extrude11 merges body 4
    # Boss-Extrude11: read off the stored shape, not the designer's step
    # Boss-Extrude11 outline → Boss-Extrude11 (add)
    with BuildSketch(Plane.XY):
        with BuildLine():
            ThreePointArc((-10, -61.693376137), (0, -57), (10, -61.693376137))
            Line((10, -61.693376137), (10, -58.819660113))
            ThreePointArc((10, -58.819660113), (0, -55), (-10, -58.819660113))
            Line((-10, -58.819660113), (-10, -61.693376137))
        make_face()
    extrude(amount=BOSS_EXTRUDE11_DEPTH)

    # Sketch44 → Cut-Extrude6 (cut)
    with BuildSketch(Plane.XY.offset(8)):
        Polygon((3.798964771, -70), (1.899482386, -66.71), (-1.899482386, -66.71), (-3.798964771, -70), (-1.899482386, -73.29), (1.899482386, -73.29), align=None)
    extrude(amount=-CUT_EXTRUDE6_DEPTH, mode=Mode.SUBTRACT)


with BuildPart() as body_2_2_3:
    # Body-Move/Copy3: moved
    add(body_2_2_2.part.rotate(Axis((0, -70, 0), (0, 0, 1)), BODY_MOVE_COPY3_ANGLE))

    # Boss-Extrude14: up to this plane
    boss_extrude14_end = Plane(origin=(0.839061186, -0.169438737, -39.320806191), z_dir=(-0.9802135658563201, 0.1979428334424811, 0))
    # Sketch46 → Boss-Extrude14 (add, up to the surface)
    with BuildSketch(Plane(origin=(2.122627486, -0.374276496, 0), x_dir=(-0.17364817766692428, -0.9848077530122092, 1.2297632139214586e-15), z_dir=(-0.9848077530122092, 0.17364817766692428, 0)), mode=Mode.PRIVATE) as boss_extrude14_sk1:
        with Locations((64.057695957, 4)):
            Rectangle(SKETCH46_W, SKETCH46_H)
    boss_extrude14_tool1 = split(extrude(boss_extrude14_sk1.sketch, amount=BOSS_EXTRUDE14_REACH, mode=Mode.PRIVATE), bisect_by=boss_extrude14_end, keep=Keep.BOTH, mode=Mode.PRIVATE)
    add(boss_extrude14_tool1.solids().sort_by_distance((-9.000875, -63.458792, 4))[0])

    # Boss-Extrude14 direction 2: up to this cylinder (the profile starts outside it)
    boss_extrude14_direction_2_end = Plane(origin=(0, -70, 4), z_dir=(0, 0, -1)) * Cylinder(BOSS_EXTRUDE14_DIRECTION_2_END_RADIUS, 452.862, mode=Mode.PRIVATE)
    # Sketch46 → Boss-Extrude14 direction 2 (add, up to the surface)
    with BuildSketch(Plane(origin=(2.122627486, -0.374276496, 0), x_dir=(-0.17364817766692428, -0.9848077530122092, 1.2297632139214586e-15), z_dir=(-0.9848077530122092, 0.17364817766692428, 0)), mode=Mode.PRIVATE) as boss_extrude14_direction_2_sk1:
        with Locations((64.057695957, 4)):
            Rectangle(SKETCH46_W, SKETCH46_H)
    boss_extrude14_direction_2_tool1 = extrude(boss_extrude14_direction_2_sk1.sketch, amount=-BOSS_EXTRUDE14_DIRECTION_2_REACH, mode=Mode.PRIVATE) - boss_extrude14_direction_2_end
    add(boss_extrude14_direction_2_tool1.solids().sort_by_distance((-9.000875, -63.458792, 4))[0])


with BuildPart() as body_2_2_4:
    # Body-Move/Copy4: moved
    add(body_2_2_3.part.rotate(Axis((0, -70, 0), (0, 0, 1)), BODY_MOVE_COPY4_ANGLE))


solid = part_1.part
